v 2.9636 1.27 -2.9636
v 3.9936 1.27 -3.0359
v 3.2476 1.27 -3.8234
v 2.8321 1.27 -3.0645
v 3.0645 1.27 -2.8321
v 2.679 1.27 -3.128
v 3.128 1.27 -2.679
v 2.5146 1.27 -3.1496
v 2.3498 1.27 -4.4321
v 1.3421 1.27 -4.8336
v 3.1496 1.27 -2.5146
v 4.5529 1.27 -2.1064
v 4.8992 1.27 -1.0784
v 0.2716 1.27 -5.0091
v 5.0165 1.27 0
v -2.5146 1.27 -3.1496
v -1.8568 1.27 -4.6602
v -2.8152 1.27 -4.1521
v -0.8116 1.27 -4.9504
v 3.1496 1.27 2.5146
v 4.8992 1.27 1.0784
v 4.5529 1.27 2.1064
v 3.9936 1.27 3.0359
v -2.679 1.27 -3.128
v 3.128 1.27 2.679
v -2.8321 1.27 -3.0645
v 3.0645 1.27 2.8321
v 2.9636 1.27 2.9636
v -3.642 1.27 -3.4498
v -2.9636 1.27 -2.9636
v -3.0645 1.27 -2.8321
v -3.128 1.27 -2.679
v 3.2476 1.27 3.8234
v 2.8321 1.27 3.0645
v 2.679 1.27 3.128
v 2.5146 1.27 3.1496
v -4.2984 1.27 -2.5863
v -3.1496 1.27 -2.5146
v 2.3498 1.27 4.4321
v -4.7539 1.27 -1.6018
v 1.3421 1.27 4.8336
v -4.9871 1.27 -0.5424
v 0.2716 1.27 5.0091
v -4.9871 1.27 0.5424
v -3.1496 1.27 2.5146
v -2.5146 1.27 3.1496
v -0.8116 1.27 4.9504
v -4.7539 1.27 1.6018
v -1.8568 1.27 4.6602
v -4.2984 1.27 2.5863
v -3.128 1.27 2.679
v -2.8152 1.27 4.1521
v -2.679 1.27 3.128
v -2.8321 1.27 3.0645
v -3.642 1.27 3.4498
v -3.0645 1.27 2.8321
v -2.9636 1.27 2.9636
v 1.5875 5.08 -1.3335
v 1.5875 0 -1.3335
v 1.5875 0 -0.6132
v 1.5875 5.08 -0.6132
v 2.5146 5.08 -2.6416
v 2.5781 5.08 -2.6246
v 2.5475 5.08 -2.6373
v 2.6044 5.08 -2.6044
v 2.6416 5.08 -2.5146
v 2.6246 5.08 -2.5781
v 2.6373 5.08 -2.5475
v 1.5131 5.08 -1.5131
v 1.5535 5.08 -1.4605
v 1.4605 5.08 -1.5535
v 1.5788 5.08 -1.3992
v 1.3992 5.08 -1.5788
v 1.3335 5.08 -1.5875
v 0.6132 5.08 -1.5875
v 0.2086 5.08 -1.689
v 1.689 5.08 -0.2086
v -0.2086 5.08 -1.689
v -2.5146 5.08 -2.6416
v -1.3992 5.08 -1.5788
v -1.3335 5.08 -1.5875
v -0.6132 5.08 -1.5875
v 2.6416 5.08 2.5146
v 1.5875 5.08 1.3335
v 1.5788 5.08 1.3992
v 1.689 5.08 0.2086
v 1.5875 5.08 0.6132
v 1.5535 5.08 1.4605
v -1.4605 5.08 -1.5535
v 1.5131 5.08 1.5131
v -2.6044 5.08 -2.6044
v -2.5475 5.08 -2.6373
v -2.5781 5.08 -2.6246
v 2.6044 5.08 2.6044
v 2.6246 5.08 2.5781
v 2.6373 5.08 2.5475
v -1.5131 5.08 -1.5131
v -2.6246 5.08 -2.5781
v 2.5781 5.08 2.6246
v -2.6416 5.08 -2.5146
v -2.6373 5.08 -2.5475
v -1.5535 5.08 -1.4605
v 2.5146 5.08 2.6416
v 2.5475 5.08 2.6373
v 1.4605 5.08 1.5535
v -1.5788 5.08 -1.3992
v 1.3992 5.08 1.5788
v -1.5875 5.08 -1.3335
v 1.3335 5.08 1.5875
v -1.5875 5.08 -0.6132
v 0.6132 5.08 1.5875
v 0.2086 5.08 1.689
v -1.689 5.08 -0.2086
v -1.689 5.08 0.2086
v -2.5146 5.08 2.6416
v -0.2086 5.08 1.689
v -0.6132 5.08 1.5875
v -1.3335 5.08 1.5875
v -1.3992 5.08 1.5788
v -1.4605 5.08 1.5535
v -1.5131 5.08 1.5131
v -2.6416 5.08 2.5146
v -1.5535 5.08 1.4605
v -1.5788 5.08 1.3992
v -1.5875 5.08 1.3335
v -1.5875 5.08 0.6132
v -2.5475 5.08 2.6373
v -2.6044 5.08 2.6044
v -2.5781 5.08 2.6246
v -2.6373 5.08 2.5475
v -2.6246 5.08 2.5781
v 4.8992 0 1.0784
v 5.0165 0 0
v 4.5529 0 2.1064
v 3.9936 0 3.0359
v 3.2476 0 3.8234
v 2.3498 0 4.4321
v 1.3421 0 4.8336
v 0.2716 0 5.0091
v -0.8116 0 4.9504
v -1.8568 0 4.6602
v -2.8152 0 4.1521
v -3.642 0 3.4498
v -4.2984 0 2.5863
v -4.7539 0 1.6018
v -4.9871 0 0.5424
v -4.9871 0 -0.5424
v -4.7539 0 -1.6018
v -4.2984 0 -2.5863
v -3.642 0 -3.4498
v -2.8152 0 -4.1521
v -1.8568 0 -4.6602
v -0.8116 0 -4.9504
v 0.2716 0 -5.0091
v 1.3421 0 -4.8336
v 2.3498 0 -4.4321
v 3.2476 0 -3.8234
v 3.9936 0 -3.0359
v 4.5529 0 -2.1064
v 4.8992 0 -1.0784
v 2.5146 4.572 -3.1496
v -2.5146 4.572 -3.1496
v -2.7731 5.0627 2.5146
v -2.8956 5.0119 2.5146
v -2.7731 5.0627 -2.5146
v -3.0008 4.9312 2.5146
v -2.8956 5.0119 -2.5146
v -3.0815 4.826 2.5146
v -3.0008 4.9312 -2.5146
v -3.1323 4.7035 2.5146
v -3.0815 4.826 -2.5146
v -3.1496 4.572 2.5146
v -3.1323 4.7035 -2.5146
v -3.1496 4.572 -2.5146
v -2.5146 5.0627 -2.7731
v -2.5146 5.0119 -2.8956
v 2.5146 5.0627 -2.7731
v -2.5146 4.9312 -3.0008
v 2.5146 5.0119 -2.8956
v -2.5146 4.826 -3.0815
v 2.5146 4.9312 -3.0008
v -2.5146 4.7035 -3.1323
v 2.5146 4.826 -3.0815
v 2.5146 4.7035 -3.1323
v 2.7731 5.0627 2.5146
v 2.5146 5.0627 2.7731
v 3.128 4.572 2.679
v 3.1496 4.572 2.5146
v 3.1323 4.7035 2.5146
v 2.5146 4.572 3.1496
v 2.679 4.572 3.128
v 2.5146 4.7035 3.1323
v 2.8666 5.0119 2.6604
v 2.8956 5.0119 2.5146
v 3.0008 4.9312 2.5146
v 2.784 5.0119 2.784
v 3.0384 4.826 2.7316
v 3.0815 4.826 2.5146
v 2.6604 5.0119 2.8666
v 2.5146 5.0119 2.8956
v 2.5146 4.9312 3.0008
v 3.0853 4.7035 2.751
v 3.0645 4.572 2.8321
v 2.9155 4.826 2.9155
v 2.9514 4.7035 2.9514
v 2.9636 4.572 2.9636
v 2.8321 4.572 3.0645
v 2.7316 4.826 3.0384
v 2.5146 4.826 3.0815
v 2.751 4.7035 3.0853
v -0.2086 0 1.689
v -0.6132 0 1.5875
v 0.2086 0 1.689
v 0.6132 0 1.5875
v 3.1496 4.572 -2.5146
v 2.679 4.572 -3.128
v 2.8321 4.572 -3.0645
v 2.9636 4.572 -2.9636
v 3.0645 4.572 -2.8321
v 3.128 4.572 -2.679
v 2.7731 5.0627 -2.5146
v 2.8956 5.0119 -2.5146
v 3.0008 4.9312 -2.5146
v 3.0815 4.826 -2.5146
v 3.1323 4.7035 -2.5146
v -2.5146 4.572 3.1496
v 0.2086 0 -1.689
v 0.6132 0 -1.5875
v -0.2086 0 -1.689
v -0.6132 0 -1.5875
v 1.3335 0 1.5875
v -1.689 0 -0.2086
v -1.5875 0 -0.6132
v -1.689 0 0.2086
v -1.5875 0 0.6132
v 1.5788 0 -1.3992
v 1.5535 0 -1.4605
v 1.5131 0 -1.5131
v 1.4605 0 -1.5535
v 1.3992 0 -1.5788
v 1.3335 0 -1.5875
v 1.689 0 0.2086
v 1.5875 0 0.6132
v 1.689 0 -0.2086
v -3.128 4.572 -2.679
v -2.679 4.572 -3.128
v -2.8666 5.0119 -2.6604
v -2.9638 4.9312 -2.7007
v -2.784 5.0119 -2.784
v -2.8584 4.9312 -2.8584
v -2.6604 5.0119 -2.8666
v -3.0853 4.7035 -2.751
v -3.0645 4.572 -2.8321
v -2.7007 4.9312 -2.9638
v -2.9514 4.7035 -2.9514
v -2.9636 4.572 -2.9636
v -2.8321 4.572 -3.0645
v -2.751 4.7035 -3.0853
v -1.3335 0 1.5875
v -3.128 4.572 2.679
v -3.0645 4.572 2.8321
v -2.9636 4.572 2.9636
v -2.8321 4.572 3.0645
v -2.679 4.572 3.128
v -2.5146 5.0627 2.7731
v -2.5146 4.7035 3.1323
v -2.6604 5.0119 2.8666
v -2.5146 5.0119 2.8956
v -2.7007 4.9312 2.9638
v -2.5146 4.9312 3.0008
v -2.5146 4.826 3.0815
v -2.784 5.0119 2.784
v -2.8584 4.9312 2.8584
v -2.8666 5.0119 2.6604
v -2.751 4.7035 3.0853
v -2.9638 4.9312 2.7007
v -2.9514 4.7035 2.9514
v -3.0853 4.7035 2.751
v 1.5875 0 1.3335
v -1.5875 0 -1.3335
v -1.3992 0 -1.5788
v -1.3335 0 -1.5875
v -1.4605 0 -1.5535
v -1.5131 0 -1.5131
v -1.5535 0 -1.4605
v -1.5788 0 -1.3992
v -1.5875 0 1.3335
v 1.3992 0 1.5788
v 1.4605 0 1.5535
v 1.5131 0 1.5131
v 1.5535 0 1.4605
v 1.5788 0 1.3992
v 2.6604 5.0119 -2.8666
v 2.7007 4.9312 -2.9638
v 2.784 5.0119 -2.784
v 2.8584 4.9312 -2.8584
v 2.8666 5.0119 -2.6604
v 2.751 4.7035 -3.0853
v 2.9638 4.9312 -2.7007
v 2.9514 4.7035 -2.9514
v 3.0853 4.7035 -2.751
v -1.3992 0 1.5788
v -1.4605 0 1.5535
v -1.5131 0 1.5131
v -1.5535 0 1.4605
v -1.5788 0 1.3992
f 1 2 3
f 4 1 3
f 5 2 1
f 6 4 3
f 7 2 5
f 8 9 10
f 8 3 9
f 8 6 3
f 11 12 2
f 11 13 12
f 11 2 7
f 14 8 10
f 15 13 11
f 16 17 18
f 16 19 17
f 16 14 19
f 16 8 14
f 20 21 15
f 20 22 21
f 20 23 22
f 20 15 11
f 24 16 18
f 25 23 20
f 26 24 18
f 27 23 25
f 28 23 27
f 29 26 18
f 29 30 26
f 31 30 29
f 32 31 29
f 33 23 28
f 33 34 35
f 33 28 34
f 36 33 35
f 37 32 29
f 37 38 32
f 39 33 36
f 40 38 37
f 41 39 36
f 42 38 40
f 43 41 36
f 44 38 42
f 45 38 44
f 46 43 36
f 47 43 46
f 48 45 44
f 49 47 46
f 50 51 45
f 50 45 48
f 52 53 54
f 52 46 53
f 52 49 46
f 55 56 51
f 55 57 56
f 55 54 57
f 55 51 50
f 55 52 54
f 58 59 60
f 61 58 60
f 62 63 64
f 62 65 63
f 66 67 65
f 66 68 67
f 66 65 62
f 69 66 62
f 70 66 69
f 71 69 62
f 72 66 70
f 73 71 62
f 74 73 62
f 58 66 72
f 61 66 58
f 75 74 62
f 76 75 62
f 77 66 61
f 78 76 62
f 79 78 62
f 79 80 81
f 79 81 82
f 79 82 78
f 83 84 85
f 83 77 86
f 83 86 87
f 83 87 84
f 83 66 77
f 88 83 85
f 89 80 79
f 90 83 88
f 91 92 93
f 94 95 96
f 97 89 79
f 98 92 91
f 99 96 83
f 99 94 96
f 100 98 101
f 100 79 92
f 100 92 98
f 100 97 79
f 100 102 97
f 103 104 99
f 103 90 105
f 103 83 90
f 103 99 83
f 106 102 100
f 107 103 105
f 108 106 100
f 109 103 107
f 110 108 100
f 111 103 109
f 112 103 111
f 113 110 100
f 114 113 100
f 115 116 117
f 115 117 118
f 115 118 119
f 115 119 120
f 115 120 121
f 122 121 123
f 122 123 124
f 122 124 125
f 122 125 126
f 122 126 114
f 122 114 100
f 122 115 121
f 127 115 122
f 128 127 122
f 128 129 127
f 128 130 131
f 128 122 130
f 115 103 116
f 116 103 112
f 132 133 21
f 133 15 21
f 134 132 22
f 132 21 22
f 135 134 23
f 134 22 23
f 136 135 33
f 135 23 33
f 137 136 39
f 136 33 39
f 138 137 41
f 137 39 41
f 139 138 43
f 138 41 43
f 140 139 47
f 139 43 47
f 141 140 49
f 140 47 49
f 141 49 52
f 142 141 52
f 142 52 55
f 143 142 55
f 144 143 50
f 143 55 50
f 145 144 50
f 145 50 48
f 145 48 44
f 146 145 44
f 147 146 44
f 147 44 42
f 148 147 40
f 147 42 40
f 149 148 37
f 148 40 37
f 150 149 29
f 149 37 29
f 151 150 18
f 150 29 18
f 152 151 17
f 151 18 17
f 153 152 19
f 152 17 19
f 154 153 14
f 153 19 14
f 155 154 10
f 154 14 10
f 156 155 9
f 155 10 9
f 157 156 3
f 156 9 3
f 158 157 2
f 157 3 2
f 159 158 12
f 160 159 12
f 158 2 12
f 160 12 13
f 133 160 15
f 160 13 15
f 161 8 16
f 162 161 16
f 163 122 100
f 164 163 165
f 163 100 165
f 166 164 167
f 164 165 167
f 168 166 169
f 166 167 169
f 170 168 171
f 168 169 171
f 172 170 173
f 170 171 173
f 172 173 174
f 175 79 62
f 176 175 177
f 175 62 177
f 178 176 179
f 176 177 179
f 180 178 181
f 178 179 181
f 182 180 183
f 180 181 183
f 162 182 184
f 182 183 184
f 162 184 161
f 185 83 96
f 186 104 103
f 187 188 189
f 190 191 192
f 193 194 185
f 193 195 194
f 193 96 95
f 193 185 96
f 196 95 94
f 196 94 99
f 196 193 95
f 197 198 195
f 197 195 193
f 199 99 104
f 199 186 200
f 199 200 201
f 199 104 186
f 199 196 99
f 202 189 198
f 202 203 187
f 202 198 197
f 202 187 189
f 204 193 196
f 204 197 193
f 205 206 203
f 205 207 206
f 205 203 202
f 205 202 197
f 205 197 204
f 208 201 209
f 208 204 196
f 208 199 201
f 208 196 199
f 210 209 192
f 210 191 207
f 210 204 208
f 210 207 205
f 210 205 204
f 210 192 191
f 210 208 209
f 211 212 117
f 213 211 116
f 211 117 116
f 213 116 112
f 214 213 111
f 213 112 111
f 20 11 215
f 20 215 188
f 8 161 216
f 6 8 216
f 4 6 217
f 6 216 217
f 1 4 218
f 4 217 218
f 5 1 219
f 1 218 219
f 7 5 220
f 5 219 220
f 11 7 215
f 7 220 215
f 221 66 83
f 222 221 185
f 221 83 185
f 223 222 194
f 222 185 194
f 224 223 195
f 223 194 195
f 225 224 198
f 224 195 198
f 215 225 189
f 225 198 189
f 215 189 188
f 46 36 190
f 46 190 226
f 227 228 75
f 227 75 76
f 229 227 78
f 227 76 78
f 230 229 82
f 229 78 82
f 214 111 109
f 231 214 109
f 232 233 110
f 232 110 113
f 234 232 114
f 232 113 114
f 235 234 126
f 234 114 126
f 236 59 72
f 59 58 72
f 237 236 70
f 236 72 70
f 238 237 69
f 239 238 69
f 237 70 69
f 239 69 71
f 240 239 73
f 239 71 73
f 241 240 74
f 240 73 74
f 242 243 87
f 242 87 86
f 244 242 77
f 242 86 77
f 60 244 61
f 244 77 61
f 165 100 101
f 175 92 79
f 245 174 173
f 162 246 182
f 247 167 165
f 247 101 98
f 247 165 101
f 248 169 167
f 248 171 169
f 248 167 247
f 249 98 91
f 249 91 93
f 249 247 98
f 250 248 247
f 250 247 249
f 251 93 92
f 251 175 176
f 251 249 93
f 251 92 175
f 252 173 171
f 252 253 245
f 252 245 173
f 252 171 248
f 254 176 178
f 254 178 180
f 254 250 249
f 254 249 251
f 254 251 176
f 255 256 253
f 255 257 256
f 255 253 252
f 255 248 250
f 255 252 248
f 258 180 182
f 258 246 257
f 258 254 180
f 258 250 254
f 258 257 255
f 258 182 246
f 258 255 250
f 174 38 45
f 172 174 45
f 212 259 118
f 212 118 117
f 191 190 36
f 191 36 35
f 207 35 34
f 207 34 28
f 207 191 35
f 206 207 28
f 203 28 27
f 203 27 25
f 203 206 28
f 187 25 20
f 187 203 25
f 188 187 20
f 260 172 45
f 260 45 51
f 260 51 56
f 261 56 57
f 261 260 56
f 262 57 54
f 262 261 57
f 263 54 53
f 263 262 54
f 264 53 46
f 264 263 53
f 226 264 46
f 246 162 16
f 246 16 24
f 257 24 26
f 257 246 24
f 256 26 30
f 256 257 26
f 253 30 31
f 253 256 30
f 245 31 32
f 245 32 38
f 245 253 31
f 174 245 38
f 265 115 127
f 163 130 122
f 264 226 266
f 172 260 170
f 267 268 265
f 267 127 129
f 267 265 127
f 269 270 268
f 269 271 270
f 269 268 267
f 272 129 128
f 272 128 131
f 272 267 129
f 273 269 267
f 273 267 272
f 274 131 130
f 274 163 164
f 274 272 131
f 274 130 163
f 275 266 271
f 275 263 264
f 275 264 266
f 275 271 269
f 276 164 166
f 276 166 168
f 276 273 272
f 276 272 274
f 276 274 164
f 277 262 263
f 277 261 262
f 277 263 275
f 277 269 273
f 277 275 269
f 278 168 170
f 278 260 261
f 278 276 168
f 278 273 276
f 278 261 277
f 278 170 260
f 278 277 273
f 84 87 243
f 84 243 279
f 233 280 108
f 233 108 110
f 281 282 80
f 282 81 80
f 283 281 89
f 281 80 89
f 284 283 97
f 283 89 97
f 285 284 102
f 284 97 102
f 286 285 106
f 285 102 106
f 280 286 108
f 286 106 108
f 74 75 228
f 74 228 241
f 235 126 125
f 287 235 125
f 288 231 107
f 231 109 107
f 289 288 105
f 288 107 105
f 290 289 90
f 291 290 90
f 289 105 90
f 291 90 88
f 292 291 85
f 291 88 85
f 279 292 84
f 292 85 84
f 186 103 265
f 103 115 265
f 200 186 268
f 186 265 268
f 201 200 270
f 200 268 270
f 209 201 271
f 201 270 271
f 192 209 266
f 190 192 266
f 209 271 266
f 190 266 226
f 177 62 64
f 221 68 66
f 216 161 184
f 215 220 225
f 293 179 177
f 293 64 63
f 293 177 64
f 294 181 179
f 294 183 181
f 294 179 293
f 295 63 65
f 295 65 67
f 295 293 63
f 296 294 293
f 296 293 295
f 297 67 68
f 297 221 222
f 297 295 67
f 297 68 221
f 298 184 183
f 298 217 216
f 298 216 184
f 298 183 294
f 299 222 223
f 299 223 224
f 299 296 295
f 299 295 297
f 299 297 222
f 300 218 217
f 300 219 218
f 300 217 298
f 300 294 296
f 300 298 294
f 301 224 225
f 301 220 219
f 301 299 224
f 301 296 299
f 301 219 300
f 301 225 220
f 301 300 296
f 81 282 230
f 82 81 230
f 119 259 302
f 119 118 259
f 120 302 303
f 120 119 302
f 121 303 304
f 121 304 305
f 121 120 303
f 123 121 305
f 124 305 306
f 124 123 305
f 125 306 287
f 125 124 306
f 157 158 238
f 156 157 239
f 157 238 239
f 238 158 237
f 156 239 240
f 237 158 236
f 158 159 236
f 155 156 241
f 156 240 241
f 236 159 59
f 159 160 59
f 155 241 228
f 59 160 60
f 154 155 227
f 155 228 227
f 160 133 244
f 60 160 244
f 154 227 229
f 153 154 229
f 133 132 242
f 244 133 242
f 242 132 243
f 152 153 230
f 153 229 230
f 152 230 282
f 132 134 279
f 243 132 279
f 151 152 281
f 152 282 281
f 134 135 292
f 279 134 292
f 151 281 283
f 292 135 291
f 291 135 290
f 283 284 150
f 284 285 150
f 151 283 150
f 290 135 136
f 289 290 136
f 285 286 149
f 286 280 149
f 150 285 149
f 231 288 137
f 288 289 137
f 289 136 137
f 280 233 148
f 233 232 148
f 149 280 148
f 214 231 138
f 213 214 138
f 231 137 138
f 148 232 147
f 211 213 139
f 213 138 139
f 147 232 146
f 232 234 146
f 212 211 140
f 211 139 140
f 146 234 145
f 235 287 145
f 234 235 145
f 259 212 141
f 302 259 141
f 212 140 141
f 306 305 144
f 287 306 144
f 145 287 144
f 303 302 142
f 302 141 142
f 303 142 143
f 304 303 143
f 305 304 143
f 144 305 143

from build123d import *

# Parameters (mm, degrees)
SKETCH1_W           = 5.0165
SKETCH1_H           = 1.27
SKETCH2_W           = 6.2992
SKETCH2_H           = 6.2992
BOSS_EXTRUDE1_DEPTH = 3.81
SKETCH3_W           = 3.175
SKETCH3_H           = 3.175
CUT_EXTRUDE1_DEPTH  = 6.08
FILLET1_R           = 0.635
FILLET2_R           = 0.254
FILLET3_R           = 0.508
SKETCH4_R           = 1.7018
CUT_EXTRUDE2_DEPTH  = 51.054


with BuildPart() as part:
    # Sketch1 → Revolve1 (revolve)
    with BuildSketch(Plane.XY):
        with Locations((2.50825, 0.635)):
            Rectangle(SKETCH1_W, SKETCH1_H)
    revolve(axis=Axis((0, 1.27, 0), (0, -1, 0)))

    # Sketch2 → Boss-Extrude1 (add)
    with BuildSketch(Plane(origin=(0, 1.27, 0), x_dir=(-1, 0, 0), z_dir=(0, 1, 0))):
        Rectangle(SKETCH2_W, SKETCH2_H)
    extrude(amount=BOSS_EXTRUDE1_DEPTH)

    # Sketch3 → Cut-Extrude1 (cut, through all)
    with BuildSketch(Plane.XZ):
        Rectangle(SKETCH3_W, SKETCH3_H)
    extrude(amount=-CUT_EXTRUDE1_DEPTH, mode=Mode.SUBTRACT)

    # Fillet1
    fillet1_edges = [part.edges().sort_by_distance(p)[0] for p in [
        (3.1496, 3.175, 3.1496),
        (3.1496, 3.175, -3.1496),
        (-3.1496, 3.175, -3.1496),
        (-3.1496, 3.175, 3.1496),
    ]]
    fillet(fillet1_edges, radius=FILLET1_R)

    # Fillet2
    fillet2_edges = [part.edges().sort_by_distance(p)[0] for p in [
        (-1.5875, 2.54, -1.5875),
        (-1.5875, 2.54, 1.5875),
        (1.5875, 2.54, 1.5875),
        (1.5875, 2.54, -1.5875),
    ]]
    fillet(fillet2_edges, radius=FILLET2_R)

    # Fillet3
    fillet3_edges = [part.edges().sort_by_distance(p)[0] for p in [
        (0, 5.08, 3.1496),
        (-3.1496, 5.08, 0),
        (3.1496, 5.08, 0),
        (0, 5.08, -3.1496),
        (2.963612806, 5.08, -2.963612806),
        (-2.963612806, 5.08, -2.963612806),
        (2.963612806, 5.08, 2.963612806),
        (-2.963612806, 5.08, 2.963612806),
    ]]
    fillet(fillet3_edges, radius=FILLET3_R)

    # Sketch4 → Cut-Extrude2 (cut)
    with BuildSketch(Plane(origin=(0, 5.08, 0), x_dir=(1, 0, 0), z_dir=(0, 1, 0))):
        Circle(SKETCH4_R)
    extrude(amount=-CUT_EXTRUDE2_DEPTH, mode=Mode.SUBTRACT)


solid = part.part
